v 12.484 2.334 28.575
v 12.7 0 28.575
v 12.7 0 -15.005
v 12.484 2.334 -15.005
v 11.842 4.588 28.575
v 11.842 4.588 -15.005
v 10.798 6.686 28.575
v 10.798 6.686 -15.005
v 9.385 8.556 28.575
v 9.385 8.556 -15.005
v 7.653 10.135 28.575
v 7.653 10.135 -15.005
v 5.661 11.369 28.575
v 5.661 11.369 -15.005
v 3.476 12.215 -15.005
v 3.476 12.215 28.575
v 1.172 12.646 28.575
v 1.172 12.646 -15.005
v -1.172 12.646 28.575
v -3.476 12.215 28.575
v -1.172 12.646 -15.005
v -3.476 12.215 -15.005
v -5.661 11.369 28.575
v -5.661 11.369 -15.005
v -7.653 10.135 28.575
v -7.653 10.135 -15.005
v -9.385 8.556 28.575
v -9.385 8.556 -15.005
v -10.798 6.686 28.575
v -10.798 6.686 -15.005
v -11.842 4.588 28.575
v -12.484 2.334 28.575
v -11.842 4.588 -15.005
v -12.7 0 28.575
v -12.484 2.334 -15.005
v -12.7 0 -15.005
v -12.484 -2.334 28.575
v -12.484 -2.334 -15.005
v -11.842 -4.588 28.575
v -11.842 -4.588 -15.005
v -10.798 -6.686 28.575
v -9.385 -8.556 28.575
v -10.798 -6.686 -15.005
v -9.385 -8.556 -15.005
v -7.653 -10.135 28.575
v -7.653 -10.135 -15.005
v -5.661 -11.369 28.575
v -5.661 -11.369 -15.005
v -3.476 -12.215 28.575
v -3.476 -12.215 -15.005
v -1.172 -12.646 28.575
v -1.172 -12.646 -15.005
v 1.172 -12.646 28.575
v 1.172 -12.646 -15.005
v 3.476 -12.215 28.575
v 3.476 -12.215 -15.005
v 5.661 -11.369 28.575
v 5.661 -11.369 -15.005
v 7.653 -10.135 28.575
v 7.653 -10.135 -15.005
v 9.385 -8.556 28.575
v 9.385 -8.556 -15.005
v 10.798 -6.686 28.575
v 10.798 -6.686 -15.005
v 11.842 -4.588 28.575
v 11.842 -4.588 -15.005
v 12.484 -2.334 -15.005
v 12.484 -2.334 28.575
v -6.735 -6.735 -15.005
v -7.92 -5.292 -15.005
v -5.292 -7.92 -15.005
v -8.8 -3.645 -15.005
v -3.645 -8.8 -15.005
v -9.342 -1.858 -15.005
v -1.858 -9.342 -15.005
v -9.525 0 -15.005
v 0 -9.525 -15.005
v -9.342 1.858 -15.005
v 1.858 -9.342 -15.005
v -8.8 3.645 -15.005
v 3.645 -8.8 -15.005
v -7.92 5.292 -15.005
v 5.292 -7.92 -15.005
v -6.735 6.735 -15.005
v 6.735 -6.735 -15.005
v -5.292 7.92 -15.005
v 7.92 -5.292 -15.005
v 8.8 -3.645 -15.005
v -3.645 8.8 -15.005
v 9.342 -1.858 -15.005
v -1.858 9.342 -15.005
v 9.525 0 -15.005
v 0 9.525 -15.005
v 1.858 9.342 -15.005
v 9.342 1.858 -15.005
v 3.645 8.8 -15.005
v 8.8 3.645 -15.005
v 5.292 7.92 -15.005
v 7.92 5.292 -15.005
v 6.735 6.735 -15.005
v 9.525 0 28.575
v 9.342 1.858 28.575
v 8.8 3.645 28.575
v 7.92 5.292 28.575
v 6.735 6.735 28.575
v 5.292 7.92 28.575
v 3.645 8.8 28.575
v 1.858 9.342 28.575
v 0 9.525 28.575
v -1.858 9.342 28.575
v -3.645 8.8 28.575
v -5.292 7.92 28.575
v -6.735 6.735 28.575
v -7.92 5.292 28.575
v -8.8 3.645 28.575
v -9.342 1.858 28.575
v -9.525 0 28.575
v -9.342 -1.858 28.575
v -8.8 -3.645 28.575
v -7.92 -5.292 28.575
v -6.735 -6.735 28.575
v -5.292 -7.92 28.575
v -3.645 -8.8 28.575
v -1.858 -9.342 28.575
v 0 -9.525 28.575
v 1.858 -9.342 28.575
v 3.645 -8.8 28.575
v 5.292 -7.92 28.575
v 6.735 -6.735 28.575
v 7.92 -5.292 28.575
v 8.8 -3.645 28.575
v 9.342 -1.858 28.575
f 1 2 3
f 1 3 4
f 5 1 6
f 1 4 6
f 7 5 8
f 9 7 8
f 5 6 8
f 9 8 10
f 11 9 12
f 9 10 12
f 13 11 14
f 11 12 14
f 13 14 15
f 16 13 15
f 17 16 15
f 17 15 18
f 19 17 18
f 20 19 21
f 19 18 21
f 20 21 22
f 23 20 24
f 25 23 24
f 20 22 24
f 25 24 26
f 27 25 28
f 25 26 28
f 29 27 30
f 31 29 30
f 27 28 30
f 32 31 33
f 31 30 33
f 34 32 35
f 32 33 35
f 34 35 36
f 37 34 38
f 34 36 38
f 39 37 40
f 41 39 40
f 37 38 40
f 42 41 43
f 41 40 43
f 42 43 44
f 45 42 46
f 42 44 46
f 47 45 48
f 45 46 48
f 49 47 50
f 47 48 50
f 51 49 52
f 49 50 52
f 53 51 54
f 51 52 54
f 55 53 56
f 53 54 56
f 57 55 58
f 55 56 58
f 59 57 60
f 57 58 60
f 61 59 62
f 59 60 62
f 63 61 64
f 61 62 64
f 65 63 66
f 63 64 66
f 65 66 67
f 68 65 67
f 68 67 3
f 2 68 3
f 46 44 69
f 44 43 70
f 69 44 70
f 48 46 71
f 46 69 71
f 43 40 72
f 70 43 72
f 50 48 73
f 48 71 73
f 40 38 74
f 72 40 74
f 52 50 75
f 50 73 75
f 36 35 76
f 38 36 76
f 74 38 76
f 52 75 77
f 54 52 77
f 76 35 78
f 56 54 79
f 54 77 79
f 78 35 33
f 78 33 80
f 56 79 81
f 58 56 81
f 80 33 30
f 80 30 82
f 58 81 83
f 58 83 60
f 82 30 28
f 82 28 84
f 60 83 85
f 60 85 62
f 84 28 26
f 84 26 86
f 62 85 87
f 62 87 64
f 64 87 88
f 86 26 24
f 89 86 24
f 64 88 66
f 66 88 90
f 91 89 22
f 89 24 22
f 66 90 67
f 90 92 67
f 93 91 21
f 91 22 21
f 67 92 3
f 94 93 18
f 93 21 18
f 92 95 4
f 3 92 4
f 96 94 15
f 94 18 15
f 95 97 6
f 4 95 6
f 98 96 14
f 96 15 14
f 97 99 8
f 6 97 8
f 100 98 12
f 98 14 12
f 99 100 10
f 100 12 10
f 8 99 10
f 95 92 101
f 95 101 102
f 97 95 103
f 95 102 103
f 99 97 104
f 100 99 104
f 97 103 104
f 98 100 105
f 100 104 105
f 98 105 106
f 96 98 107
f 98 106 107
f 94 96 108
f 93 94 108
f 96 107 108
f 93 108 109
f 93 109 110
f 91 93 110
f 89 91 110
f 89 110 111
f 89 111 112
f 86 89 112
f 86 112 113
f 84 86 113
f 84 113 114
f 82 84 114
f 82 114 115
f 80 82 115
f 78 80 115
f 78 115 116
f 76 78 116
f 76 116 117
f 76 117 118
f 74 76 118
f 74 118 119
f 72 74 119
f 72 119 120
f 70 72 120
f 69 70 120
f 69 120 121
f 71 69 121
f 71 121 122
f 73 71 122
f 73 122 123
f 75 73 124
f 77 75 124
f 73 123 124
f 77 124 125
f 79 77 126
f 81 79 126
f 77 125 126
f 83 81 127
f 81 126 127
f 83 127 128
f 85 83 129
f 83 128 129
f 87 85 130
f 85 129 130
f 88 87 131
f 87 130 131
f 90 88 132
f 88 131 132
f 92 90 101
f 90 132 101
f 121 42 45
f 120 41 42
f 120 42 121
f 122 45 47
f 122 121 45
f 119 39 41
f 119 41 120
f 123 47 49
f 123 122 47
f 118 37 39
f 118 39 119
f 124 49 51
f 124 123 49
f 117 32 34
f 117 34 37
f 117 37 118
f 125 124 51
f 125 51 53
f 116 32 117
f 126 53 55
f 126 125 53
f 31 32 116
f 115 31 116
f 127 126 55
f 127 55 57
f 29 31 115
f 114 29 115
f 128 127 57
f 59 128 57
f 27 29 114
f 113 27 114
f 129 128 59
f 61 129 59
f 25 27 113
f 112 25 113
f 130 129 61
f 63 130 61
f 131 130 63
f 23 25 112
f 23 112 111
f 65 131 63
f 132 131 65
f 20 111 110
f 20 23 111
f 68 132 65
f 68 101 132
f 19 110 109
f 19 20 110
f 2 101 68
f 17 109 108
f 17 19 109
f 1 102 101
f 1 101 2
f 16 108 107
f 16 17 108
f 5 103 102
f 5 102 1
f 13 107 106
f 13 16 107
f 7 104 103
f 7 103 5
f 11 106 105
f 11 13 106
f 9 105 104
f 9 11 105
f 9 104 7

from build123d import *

# Parameters (mm, degrees)
SKETCH1_R          = 12.7
BASE_EXTRUDE_DEPTH = 28.575
SKETCH2_R          = 9.525
CUT_EXTRUDE1_DEPTH = 34.750712955
SKETCH_1_R         = 12.7
SKETCH_1_R_2       = 9.525
EXTRUDE_1_DEPTH    = 43.58


with BuildPart() as part:
    # Sketch1 → Base-Extrude (new body)
    with BuildSketch(Plane.XY):
        Circle(SKETCH1_R)
    extrude(amount=BASE_EXTRUDE_DEPTH)

    # Sketch2 → Cut-Extrude1 (cut, through all)
    with BuildSketch(Plane.XY.offset(28.575)):
        Circle(SKETCH2_R)
    extrude(amount=-CUT_EXTRUDE1_DEPTH, mode=Mode.SUBTRACT)

    # Эскиз1 → Бобышка-Вытянуть1 (add)
    with BuildSketch(Plane.XY.offset(28.575)):
        Circle(SKETCH_1_R)
        Circle(SKETCH_1_R_2, mode=Mode.SUBTRACT)
    extrude(amount=-EXTRUDE_1_DEPTH)


solid = part.part
